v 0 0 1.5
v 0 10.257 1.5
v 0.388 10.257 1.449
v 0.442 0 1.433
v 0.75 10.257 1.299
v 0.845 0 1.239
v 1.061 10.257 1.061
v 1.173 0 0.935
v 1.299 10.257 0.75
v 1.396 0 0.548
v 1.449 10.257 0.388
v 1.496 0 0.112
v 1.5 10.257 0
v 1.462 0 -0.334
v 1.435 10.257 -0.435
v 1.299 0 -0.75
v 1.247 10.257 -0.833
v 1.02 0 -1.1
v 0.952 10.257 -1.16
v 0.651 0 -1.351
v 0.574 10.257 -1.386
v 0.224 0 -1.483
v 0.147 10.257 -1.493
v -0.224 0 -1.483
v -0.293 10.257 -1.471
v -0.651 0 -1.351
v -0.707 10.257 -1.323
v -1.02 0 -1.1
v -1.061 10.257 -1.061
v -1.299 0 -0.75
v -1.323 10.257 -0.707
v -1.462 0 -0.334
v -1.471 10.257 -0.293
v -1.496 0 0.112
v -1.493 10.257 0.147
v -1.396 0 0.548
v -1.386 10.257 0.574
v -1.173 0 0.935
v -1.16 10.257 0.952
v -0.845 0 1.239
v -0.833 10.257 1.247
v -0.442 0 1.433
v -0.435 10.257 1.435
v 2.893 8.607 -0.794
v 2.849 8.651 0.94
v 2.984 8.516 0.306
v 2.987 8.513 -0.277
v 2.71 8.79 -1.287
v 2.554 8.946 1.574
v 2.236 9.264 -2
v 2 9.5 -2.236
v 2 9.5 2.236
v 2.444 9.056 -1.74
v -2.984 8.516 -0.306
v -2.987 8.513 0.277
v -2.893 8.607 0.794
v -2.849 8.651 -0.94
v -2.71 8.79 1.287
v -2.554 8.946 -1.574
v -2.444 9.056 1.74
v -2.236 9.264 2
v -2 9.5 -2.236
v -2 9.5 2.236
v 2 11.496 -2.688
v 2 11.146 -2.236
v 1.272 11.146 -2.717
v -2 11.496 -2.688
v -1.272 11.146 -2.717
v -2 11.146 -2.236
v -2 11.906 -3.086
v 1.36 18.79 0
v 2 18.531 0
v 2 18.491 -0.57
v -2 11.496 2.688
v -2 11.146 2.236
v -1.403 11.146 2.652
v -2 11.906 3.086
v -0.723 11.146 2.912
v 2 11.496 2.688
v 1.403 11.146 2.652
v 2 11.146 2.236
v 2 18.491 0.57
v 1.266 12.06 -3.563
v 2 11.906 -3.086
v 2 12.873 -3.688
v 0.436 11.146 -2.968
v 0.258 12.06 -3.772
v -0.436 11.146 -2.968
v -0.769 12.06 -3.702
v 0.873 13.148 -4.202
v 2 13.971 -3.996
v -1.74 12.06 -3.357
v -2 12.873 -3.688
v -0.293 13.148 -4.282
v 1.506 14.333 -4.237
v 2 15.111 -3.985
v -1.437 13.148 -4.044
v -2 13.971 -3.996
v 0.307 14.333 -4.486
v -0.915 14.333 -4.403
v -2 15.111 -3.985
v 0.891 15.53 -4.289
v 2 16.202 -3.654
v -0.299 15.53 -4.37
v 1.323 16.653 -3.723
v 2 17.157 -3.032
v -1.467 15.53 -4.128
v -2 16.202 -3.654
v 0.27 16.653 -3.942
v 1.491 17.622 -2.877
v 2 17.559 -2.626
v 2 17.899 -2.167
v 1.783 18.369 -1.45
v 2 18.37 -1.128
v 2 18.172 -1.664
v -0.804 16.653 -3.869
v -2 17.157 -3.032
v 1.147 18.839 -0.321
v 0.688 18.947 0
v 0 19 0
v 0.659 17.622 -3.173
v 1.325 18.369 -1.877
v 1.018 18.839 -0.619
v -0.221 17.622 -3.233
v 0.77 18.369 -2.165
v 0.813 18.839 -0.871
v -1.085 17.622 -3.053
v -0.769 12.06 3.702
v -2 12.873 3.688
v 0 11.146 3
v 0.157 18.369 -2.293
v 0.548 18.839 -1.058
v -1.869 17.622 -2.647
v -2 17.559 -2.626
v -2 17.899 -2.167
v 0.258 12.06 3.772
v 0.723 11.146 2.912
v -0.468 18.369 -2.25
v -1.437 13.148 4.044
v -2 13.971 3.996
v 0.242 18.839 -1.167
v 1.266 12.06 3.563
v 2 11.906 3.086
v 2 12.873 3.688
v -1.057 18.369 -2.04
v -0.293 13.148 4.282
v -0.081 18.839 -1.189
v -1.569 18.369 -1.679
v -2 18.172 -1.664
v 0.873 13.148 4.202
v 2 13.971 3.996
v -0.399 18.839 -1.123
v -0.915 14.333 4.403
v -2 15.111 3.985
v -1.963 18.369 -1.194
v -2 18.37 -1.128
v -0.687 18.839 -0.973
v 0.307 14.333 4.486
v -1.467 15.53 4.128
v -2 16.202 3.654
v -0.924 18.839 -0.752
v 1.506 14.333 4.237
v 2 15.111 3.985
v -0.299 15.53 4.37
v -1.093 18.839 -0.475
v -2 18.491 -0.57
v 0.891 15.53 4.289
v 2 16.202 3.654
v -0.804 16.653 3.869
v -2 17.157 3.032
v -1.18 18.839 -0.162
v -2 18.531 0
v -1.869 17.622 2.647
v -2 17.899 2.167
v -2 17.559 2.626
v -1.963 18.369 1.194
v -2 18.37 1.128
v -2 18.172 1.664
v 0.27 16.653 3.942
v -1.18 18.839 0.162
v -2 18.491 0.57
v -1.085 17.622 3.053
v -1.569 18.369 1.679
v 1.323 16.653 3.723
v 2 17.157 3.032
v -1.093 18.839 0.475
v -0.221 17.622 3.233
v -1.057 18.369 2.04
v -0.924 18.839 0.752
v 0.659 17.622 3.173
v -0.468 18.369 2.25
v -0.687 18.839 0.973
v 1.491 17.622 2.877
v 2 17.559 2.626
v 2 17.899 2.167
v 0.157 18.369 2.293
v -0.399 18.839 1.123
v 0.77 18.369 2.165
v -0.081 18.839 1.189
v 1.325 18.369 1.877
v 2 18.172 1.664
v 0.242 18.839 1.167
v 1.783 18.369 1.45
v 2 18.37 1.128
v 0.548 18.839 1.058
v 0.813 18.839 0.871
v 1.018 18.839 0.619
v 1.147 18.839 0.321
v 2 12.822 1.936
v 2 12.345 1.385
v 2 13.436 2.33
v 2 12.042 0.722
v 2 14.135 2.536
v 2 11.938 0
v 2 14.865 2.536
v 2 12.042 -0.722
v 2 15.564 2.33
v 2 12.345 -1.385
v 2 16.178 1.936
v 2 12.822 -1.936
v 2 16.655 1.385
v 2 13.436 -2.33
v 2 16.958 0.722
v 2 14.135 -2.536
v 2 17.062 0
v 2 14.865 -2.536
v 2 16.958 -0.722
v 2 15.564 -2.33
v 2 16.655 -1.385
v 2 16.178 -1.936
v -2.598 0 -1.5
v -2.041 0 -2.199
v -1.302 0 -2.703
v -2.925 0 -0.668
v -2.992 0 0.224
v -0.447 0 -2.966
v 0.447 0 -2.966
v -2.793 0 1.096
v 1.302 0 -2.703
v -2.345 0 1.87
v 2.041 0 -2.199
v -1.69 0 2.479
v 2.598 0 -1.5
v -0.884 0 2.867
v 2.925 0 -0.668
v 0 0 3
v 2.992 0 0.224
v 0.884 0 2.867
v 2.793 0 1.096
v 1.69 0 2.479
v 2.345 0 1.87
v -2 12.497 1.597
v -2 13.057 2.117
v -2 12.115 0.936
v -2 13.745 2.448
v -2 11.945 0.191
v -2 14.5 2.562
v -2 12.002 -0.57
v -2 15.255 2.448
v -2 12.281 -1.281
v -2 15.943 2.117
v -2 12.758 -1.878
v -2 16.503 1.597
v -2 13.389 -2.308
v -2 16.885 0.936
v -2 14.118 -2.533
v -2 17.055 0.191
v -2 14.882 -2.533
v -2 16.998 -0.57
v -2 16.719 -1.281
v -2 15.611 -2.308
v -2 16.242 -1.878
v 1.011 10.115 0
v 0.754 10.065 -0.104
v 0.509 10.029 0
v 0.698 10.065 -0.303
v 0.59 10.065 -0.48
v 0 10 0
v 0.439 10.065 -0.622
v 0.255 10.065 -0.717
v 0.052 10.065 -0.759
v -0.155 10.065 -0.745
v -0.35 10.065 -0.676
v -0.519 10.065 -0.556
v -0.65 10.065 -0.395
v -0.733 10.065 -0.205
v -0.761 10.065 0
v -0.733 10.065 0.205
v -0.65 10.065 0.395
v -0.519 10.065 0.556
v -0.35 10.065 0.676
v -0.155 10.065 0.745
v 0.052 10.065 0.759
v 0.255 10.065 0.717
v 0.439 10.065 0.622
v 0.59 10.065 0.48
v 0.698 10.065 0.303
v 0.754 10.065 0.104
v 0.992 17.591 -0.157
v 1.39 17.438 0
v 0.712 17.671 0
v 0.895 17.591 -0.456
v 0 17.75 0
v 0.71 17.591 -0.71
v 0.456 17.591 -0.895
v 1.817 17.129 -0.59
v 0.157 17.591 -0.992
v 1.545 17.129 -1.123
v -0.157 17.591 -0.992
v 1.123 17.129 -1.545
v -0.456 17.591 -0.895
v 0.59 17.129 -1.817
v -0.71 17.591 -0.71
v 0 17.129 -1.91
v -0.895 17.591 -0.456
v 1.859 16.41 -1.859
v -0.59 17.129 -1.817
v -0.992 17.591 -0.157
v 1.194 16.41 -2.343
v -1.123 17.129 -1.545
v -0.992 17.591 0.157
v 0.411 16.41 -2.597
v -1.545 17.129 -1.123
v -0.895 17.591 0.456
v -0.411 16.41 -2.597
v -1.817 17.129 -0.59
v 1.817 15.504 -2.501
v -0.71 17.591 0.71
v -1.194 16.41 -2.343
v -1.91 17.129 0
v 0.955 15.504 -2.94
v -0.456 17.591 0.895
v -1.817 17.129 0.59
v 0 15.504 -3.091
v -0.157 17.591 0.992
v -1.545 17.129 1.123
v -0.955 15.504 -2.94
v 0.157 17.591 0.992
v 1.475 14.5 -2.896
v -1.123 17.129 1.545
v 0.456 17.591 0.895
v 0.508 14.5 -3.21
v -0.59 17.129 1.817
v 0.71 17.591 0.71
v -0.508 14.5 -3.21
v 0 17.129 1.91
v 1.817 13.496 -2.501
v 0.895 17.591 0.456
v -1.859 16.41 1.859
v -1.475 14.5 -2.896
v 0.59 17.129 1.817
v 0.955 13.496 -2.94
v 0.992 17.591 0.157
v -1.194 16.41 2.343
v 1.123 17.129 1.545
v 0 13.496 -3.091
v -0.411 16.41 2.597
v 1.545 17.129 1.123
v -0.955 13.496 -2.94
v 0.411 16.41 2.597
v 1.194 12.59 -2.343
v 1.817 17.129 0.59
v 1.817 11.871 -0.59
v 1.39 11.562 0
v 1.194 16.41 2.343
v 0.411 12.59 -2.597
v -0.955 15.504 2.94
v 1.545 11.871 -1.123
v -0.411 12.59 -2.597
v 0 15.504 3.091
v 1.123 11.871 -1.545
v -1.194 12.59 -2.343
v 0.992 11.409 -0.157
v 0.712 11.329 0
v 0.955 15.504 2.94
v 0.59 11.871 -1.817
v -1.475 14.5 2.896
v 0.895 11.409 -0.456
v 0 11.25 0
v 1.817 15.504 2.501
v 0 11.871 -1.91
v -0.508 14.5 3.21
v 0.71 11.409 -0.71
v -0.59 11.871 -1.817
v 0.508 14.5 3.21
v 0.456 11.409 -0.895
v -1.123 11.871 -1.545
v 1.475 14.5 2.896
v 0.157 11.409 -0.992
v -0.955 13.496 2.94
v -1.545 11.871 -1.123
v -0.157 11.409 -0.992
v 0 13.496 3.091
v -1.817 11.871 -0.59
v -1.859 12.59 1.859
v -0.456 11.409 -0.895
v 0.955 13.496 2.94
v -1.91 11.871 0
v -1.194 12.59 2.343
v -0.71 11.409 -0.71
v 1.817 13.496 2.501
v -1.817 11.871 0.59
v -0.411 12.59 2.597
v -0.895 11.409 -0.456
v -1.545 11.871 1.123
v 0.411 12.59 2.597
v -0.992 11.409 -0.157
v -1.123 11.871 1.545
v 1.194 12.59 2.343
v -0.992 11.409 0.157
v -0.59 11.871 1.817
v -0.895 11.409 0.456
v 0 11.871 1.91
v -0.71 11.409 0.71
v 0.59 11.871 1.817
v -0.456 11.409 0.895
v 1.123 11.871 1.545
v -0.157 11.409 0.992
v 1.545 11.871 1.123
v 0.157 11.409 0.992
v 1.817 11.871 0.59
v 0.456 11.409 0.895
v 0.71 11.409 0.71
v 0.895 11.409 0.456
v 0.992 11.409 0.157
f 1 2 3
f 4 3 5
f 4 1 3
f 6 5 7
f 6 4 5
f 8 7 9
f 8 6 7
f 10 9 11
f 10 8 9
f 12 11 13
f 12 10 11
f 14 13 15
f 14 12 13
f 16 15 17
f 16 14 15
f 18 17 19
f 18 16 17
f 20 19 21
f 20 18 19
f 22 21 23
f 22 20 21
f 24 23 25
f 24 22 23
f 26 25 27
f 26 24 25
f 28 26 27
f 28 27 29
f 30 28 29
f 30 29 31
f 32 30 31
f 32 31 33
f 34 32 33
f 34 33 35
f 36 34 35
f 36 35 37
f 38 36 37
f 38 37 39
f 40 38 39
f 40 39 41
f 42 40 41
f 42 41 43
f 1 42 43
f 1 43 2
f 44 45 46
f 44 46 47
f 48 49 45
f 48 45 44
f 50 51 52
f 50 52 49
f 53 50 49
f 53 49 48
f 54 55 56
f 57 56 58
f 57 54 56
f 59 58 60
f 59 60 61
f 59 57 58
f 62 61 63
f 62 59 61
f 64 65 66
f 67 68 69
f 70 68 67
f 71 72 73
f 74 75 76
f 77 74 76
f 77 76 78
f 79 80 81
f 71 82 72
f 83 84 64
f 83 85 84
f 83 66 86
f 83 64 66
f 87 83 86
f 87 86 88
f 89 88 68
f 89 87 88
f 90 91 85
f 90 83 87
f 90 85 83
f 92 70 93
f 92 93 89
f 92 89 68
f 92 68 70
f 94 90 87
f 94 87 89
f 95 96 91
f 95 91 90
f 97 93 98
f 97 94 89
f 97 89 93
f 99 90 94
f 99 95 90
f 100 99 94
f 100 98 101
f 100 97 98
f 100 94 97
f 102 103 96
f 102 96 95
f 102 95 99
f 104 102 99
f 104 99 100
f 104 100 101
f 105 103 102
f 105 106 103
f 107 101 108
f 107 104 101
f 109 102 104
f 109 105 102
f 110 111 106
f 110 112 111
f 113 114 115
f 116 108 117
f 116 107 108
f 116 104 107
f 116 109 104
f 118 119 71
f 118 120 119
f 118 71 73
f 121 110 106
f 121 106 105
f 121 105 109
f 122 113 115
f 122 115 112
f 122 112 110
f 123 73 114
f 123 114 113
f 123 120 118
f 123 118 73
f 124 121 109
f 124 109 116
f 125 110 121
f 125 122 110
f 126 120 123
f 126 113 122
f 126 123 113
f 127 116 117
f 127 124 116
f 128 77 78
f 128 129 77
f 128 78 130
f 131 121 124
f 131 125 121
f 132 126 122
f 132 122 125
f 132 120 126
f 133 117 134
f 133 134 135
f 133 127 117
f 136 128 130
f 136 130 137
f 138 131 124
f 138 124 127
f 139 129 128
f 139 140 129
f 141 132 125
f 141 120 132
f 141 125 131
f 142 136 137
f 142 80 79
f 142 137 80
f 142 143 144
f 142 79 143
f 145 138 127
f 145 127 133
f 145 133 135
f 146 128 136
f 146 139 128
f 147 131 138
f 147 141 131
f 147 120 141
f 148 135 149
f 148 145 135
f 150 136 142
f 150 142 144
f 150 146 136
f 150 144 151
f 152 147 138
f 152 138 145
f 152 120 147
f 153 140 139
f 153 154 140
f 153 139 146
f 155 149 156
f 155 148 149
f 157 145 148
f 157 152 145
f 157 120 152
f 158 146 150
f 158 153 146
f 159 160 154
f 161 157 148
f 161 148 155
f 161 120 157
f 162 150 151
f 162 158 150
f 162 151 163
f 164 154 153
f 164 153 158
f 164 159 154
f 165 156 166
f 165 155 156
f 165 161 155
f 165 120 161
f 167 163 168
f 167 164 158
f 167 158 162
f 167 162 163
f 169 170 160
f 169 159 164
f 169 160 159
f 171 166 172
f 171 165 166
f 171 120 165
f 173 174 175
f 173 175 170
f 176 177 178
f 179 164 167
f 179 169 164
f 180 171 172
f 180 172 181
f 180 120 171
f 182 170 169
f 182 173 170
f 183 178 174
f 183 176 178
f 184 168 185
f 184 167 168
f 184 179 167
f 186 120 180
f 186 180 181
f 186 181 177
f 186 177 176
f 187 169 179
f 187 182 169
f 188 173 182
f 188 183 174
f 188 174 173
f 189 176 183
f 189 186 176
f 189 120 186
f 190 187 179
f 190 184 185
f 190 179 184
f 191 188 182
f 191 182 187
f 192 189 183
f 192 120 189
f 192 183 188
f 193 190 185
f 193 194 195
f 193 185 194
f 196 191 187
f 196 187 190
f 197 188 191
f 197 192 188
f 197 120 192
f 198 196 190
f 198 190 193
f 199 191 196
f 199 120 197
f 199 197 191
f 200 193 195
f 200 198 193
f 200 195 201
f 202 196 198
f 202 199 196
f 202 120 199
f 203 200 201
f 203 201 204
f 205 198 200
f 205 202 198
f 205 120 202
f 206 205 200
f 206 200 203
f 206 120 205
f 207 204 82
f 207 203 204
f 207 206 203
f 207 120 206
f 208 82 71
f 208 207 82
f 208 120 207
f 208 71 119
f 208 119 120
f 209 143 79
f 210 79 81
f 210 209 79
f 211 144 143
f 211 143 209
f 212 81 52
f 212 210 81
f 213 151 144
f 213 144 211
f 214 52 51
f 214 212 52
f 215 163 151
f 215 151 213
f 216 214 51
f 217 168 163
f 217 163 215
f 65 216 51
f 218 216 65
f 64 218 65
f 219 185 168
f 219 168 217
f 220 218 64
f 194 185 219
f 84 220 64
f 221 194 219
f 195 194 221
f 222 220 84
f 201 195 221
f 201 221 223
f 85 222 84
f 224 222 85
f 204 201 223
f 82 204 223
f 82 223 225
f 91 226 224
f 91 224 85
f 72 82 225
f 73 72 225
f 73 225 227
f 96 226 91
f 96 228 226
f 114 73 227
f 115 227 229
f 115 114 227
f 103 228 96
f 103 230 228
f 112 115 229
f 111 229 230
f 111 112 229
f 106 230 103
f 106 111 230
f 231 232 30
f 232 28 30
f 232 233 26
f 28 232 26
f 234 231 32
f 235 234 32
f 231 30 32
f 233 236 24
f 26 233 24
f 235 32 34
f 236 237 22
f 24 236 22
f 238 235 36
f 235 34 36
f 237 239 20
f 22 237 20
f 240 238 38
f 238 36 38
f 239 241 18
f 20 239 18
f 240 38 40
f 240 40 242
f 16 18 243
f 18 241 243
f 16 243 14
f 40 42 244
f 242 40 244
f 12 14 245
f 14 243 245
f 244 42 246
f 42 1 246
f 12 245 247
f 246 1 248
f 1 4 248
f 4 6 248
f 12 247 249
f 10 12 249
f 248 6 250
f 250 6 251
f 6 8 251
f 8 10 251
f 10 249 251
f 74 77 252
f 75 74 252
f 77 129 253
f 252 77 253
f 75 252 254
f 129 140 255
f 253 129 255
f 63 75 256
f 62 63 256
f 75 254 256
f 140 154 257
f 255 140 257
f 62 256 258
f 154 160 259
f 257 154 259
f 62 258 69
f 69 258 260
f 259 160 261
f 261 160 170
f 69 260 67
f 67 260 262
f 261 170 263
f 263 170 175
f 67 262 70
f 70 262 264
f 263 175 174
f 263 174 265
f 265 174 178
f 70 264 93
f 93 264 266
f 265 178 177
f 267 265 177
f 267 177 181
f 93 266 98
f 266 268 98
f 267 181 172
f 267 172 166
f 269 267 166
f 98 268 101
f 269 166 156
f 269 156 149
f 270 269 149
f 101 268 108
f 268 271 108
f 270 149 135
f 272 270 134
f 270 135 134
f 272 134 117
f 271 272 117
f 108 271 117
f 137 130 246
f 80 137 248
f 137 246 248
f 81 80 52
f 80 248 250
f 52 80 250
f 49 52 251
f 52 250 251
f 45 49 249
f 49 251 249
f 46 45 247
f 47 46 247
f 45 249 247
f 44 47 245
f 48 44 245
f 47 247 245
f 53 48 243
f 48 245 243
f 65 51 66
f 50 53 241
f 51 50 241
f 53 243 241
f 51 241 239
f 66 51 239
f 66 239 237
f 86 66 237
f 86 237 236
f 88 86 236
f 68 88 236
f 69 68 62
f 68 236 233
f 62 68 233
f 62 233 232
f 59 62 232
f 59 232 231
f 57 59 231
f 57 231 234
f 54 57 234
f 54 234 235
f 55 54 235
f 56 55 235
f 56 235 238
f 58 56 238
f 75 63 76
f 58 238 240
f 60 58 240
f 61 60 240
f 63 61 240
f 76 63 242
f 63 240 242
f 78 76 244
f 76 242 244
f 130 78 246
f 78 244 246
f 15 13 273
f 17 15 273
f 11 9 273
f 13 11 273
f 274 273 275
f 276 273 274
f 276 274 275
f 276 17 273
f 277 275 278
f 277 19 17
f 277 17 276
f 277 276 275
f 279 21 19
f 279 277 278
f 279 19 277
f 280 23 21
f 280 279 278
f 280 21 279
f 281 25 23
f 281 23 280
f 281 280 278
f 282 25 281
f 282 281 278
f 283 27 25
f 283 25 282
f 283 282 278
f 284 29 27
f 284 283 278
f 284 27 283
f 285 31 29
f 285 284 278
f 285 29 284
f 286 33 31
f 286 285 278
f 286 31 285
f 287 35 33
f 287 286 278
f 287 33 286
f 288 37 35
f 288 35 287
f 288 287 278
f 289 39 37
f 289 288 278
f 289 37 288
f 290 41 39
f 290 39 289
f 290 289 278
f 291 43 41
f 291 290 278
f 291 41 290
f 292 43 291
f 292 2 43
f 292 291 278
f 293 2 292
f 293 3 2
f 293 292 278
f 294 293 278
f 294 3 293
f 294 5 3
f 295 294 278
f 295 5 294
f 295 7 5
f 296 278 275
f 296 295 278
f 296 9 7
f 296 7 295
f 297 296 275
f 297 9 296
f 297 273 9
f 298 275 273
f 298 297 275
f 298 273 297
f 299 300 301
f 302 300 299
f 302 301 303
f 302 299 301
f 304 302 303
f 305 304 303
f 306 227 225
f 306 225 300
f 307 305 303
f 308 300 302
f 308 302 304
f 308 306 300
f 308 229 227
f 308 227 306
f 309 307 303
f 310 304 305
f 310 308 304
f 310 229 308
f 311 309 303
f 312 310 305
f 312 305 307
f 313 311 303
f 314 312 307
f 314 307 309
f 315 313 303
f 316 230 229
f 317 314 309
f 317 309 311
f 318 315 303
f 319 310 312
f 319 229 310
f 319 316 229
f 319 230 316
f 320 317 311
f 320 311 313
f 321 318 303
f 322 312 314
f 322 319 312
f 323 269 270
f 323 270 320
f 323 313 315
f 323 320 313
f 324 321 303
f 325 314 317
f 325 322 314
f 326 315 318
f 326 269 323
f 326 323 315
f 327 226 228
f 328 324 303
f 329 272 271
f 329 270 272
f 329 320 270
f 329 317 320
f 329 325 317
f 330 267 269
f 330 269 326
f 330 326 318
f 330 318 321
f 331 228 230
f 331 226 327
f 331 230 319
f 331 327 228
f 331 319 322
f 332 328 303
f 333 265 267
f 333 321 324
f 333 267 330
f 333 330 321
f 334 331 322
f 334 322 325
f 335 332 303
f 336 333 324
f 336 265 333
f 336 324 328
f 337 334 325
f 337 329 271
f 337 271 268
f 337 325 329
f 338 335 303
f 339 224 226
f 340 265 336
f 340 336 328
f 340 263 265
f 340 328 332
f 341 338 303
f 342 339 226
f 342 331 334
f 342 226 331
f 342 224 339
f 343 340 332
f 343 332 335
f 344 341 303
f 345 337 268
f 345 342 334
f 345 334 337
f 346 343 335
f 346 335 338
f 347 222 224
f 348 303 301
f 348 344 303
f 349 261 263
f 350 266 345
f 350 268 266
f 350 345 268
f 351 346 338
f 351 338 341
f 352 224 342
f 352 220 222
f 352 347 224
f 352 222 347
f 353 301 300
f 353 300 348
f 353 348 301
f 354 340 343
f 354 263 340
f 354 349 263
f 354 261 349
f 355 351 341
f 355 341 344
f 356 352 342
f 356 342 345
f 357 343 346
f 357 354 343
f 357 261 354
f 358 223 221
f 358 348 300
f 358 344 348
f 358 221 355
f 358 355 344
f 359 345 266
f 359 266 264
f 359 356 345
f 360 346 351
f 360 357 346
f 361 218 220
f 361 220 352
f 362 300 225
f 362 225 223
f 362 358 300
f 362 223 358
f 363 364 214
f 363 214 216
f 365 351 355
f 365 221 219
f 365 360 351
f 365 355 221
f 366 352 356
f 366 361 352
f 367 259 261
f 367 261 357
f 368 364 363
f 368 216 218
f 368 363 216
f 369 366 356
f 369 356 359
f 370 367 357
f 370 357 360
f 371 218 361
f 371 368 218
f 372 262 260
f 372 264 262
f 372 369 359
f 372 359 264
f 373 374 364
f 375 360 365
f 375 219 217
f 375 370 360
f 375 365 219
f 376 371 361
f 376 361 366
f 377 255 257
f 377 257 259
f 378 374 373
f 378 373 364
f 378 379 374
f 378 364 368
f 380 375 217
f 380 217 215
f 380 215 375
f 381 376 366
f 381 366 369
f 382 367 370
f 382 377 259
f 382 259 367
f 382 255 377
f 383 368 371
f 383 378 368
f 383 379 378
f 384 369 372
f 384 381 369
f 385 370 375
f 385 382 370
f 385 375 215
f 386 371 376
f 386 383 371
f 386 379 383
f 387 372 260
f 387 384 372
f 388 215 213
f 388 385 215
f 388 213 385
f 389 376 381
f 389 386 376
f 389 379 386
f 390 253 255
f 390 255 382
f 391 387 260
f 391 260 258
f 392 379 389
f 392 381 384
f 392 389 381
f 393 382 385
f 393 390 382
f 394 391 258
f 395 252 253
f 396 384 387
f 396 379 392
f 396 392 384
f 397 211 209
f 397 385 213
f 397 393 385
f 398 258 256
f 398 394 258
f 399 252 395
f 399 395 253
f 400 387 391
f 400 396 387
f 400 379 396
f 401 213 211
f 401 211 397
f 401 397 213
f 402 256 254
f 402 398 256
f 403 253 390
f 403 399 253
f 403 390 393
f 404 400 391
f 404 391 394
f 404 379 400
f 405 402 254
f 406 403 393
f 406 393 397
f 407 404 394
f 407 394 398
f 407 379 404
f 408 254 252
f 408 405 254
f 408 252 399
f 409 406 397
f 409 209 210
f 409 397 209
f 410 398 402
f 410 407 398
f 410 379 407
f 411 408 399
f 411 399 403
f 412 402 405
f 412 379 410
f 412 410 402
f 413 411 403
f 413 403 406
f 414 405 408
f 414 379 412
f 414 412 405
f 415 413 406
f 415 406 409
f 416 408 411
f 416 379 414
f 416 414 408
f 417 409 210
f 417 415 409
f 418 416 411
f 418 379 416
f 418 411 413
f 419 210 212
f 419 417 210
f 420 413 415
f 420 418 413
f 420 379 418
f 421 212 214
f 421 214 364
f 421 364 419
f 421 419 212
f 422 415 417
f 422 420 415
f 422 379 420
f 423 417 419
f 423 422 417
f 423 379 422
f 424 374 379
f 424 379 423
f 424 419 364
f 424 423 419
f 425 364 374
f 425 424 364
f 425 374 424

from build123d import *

# Parameters (mm, degrees)
SKETCH1_R           = 3
SKETCH1_R_2         = 1.5
BOSS_EXTRUDE1_DEPTH = 11.5
SKETCH3_W           = 9
SKETCH3_H           = 9.5
CUT_EXTRUDE1_DEPTH  = 10
SKETCH4_W           = 9
SKETCH4_H           = 9.5
CUT_EXTRUDE2_DEPTH  = 10
SKETCH5_W           = 2
SKETCH5_H           = 4.472135954
CUT_EXTRUDE3_DEPTH  = 10
SKETCH6_W           = 2
SKETCH6_H           = 4.472135954
CUT_EXTRUDE4_DEPTH  = 10


# Read off the part's stored shape, not the designer's step: Revolve13
with BuildPart() as part:
    # Sketch1 → Boss-Extrude1 (new body)
    with BuildSketch(Plane(origin=(0, 0, 0), x_dir=(1, 0, 0), z_dir=(0, 1, 0))):
        with Locations(Location((0, 0, 0), (0, 0, 270))):
            Circle(SKETCH1_R)
        with Locations(Location((0, 0, 0), (0, 0, 270))):
            Circle(SKETCH1_R_2, mode=Mode.SUBTRACT)
    extrude(amount=BOSS_EXTRUDE1_DEPTH)

    # Revolve13 outline → Revolve13 (revolve)
    with BuildSketch(Plane.XY):
        with BuildLine():
            ThreePointArc((2.999999997, 11.145898031), (4.203775616, 16.105699402), (0, 19))
            Line((0, 19), (0, 17.75))
            ThreePointArc((0, 17.75), (3.25, 14.5), (0, 11.25))
            Line((0, 11.25), (0, 10))
            ThreePointArc((0, 10), (0.760958906, 10.064806482), (1.500000004, 10.257359314))
            Line((1.500000004, 10.257359314), (1.5, 11.5))
            Line((1.5, 11.5), (3, 11.5))
            Line((3, 11.5), (2.999999997, 11.145898031))
        make_face()
    revolve(axis=Axis((0, 0, 0), (0, 1, 0)))

    # Sketch3 → Cut-Extrude1 (cut)
    with BuildSketch(Plane(origin=(2, 0, 0), x_dir=(0, 0, -1), z_dir=(1, 0, 0))):
        with Locations((0, 14.25)):
            Rectangle(SKETCH3_W, SKETCH3_H)
    extrude(amount=CUT_EXTRUDE1_DEPTH, mode=Mode.SUBTRACT)

    # Sketch4 → Cut-Extrude2 (cut)
    with BuildSketch(Plane(origin=(-2, 0, 0), x_dir=(0, 0, -1), z_dir=(1, 0, 0))):
        with Locations((0, 14.25)):
            Rectangle(SKETCH4_W, SKETCH4_H)
    extrude(amount=-CUT_EXTRUDE2_DEPTH, mode=Mode.SUBTRACT)

    # Sketch5 → Cut-Extrude3 (cut)
    with BuildSketch(Plane(origin=(5.75, 5.75, 0), x_dir=(0.7071067811865477, -0.7071067811865475, 0), z_dir=(0.7071067811865475, 0.7071067811865477, 0))):
        with Locations((-4.303300859, 0)):
            Rectangle(SKETCH5_W, SKETCH5_H)
    extrude(amount=CUT_EXTRUDE3_DEPTH, mode=Mode.SUBTRACT)

    # Sketch6 → Cut-Extrude4 (cut)
    with BuildSketch(Plane(origin=(-5.75, 5.75, 0), x_dir=(0.7071067811865476, 0.7071067811865476, 0), z_dir=(-0.7071067811865476, 0.7071067811865476, 0))):
        with Locations((4.303300859, 0)):
            Rectangle(SKETCH6_W, SKETCH6_H)
    extrude(amount=CUT_EXTRUDE4_DEPTH, mode=Mode.SUBTRACT)


solid = part.part
